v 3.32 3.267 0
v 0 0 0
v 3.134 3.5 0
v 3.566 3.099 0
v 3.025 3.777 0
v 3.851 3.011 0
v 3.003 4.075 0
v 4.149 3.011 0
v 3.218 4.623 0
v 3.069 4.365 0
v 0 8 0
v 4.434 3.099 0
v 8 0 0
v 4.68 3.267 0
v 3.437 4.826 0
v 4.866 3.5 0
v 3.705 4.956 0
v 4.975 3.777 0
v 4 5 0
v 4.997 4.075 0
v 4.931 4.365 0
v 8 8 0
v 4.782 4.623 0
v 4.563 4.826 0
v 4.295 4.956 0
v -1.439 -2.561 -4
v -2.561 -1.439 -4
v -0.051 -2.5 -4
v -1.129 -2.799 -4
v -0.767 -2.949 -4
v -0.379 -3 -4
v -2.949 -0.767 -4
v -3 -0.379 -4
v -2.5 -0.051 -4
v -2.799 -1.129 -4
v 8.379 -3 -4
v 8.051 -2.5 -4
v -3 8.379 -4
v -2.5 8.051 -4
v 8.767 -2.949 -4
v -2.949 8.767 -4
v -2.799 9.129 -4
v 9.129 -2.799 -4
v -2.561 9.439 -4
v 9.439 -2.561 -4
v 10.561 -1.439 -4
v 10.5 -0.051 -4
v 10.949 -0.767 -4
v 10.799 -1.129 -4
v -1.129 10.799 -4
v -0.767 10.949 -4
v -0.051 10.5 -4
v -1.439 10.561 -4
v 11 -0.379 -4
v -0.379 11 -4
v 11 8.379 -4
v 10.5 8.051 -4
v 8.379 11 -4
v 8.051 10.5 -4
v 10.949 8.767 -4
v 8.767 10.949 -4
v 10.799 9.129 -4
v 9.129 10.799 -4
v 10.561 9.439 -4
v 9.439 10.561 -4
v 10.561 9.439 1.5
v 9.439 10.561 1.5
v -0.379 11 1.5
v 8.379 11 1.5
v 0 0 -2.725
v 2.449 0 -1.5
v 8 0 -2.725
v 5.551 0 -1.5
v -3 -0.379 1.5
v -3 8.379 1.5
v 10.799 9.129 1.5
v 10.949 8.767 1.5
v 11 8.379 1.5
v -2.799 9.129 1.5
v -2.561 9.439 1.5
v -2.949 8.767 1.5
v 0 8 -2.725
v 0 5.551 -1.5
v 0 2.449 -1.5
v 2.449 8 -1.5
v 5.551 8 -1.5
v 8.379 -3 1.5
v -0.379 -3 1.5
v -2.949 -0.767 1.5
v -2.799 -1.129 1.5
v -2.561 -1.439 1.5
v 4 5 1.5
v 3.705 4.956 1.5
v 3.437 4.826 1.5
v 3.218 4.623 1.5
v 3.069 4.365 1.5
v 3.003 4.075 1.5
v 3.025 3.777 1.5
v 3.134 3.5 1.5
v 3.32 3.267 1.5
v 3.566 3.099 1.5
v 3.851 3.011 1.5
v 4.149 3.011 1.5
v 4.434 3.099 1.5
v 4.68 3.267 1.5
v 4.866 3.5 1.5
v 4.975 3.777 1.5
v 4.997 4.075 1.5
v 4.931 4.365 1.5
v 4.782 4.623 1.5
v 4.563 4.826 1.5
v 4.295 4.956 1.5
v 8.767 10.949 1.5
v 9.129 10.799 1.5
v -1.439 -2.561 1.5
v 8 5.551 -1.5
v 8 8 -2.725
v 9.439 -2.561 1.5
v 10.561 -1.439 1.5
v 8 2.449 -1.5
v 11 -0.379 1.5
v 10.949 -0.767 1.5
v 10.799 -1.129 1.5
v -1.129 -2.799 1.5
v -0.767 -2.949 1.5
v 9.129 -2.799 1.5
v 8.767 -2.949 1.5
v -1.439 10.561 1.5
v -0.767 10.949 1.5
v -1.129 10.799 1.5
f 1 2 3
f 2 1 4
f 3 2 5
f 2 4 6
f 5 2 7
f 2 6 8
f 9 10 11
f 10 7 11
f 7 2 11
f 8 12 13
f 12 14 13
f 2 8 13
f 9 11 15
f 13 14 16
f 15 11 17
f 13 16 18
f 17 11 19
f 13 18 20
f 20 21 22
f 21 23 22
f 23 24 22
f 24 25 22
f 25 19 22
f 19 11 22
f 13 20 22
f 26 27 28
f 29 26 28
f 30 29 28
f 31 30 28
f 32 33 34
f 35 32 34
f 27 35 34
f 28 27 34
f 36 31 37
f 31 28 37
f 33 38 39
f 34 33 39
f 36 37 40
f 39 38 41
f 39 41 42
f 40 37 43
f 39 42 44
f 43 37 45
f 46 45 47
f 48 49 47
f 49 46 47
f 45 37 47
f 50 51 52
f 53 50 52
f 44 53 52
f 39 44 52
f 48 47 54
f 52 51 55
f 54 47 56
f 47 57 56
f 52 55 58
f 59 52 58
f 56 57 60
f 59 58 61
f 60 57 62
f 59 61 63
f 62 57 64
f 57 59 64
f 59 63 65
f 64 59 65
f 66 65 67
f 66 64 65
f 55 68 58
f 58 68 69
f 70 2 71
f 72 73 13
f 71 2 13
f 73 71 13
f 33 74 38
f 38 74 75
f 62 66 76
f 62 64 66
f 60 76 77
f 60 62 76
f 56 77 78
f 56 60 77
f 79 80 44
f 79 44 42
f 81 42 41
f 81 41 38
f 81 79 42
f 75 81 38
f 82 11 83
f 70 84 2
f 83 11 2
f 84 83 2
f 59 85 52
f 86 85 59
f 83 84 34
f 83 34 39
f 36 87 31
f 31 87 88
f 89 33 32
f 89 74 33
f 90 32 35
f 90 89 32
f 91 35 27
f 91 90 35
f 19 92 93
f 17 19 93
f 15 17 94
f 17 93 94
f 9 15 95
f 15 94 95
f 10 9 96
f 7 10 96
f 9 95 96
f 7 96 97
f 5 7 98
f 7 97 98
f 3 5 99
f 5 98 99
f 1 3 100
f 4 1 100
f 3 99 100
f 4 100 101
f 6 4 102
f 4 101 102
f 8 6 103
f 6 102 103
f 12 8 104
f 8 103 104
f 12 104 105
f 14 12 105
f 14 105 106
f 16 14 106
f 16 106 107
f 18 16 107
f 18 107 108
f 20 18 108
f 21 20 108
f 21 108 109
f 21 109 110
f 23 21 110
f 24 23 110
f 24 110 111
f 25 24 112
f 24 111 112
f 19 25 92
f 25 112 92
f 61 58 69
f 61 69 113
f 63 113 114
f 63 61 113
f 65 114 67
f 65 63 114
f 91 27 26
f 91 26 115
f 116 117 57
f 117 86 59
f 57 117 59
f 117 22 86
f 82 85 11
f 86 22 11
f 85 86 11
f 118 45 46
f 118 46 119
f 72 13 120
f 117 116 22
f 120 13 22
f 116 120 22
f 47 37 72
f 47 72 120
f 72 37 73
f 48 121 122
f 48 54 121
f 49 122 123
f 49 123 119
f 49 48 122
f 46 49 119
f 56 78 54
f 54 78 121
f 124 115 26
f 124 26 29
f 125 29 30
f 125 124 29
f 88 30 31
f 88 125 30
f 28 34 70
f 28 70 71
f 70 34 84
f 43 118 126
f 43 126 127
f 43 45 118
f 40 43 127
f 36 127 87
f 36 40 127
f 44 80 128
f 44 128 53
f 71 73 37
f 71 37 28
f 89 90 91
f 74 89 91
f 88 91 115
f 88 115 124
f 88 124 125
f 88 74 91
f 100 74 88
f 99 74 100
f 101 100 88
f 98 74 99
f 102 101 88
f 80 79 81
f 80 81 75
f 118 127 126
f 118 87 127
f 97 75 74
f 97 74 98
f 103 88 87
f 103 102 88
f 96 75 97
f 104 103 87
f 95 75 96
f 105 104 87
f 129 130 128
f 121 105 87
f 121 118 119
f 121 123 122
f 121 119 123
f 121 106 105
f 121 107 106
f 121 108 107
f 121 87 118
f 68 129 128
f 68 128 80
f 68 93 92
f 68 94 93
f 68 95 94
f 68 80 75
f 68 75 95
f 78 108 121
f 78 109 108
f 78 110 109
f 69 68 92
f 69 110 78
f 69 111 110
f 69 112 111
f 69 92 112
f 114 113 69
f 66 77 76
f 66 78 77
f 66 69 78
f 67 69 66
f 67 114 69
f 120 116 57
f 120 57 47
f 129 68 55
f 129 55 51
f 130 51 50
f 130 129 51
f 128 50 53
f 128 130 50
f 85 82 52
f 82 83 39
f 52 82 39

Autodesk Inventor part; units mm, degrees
ref_plane "YZ Plane" through (0, 0, 0) normal (1, 0, 0) x (0, 1, 0)
ref_plane "XZ Plane" through (0, 0, 0) normal (0, 1, 0) x (-1, 0, 0)
ref_plane "XY Plane" through (0, 0, 0) normal (0, 0, 1) x (1, 0, 0)
sketch "Sketch1" plane through (0, 0, 0) normal (0, 0, 1) x (1, 0, 0)
  line L0 (0, 0) -> (8, 0)
  line L1 (8, 0) -> (8, 8)
  line L2 (8, 8) -> (0, 8)
  line L3 (0, 8) -> (0, 0)
  line L4 (-3, 11) -> (11, 11)
  line L5 (11, 11) -> (11, -3)
  line L6 (11, -3) -> (-3, -3)
  line L7 (-3, -3) -> (-3, 11)
  dimension "d0" = 8
  dimension "d1" = 8
  dimension "d2" = 3
extrude "Extrusion1" add sketch "Sketch1" along normal blind 1.5 contours L3 L2 L1 L0 | L4 L5 L6 L7
extrude "Extrusion2" add sketch "Sketch1" against normal blind 4
chamfer "Chamfer1" distance 2.5 angle 45 4 edges at (8, 4, -4) (4, 0, -4) (4, 8, -4) (0, 4, -4)
sketch "Sketch2" plane through (0, 0, 0) normal (0, 0, -1) x (-1, 0, 0)
  line L0 (-8, 8) -> (-8, 0) projected
  line L1 (-8, 0) -> (0, 0) projected
  line L2 (0, 0) -> (0, 8) projected
  line L3 (0, 8) -> (-8, 8) projected
  point P0 (-4, 4)
hole "Hole1" at (4, 4, 0) direction (0, 0, 1) diameter 2 depth 8 tip angle 118
chamfer "Chamfer2" distance 2 angle 45 8 edges at (9.25, 9.25, -2.75) (-1.25, 9.25, -2.75) (-1.25, -1.25, -2.75) (9.25, -1.25, -2.75) (11, -3, -1.25) (11, 11, -1.25) (-3, -3, -1.25) (-3, 11, -1.25)
fillet "Fillet2" radius 1.5 8 edges at (11, 9, -1.25) (9, 11, -1.25) (11, -1, -1.25) (9, -3, -1.25) (-1, -3, -1.25) (-3, -1, -1.25) (-1, 11, -1.25) (-3, 9, -1.25)
properties part number "CNCM_ALU_Visual_inspection_tray_leg_holder" material "Aluminum 6061"
